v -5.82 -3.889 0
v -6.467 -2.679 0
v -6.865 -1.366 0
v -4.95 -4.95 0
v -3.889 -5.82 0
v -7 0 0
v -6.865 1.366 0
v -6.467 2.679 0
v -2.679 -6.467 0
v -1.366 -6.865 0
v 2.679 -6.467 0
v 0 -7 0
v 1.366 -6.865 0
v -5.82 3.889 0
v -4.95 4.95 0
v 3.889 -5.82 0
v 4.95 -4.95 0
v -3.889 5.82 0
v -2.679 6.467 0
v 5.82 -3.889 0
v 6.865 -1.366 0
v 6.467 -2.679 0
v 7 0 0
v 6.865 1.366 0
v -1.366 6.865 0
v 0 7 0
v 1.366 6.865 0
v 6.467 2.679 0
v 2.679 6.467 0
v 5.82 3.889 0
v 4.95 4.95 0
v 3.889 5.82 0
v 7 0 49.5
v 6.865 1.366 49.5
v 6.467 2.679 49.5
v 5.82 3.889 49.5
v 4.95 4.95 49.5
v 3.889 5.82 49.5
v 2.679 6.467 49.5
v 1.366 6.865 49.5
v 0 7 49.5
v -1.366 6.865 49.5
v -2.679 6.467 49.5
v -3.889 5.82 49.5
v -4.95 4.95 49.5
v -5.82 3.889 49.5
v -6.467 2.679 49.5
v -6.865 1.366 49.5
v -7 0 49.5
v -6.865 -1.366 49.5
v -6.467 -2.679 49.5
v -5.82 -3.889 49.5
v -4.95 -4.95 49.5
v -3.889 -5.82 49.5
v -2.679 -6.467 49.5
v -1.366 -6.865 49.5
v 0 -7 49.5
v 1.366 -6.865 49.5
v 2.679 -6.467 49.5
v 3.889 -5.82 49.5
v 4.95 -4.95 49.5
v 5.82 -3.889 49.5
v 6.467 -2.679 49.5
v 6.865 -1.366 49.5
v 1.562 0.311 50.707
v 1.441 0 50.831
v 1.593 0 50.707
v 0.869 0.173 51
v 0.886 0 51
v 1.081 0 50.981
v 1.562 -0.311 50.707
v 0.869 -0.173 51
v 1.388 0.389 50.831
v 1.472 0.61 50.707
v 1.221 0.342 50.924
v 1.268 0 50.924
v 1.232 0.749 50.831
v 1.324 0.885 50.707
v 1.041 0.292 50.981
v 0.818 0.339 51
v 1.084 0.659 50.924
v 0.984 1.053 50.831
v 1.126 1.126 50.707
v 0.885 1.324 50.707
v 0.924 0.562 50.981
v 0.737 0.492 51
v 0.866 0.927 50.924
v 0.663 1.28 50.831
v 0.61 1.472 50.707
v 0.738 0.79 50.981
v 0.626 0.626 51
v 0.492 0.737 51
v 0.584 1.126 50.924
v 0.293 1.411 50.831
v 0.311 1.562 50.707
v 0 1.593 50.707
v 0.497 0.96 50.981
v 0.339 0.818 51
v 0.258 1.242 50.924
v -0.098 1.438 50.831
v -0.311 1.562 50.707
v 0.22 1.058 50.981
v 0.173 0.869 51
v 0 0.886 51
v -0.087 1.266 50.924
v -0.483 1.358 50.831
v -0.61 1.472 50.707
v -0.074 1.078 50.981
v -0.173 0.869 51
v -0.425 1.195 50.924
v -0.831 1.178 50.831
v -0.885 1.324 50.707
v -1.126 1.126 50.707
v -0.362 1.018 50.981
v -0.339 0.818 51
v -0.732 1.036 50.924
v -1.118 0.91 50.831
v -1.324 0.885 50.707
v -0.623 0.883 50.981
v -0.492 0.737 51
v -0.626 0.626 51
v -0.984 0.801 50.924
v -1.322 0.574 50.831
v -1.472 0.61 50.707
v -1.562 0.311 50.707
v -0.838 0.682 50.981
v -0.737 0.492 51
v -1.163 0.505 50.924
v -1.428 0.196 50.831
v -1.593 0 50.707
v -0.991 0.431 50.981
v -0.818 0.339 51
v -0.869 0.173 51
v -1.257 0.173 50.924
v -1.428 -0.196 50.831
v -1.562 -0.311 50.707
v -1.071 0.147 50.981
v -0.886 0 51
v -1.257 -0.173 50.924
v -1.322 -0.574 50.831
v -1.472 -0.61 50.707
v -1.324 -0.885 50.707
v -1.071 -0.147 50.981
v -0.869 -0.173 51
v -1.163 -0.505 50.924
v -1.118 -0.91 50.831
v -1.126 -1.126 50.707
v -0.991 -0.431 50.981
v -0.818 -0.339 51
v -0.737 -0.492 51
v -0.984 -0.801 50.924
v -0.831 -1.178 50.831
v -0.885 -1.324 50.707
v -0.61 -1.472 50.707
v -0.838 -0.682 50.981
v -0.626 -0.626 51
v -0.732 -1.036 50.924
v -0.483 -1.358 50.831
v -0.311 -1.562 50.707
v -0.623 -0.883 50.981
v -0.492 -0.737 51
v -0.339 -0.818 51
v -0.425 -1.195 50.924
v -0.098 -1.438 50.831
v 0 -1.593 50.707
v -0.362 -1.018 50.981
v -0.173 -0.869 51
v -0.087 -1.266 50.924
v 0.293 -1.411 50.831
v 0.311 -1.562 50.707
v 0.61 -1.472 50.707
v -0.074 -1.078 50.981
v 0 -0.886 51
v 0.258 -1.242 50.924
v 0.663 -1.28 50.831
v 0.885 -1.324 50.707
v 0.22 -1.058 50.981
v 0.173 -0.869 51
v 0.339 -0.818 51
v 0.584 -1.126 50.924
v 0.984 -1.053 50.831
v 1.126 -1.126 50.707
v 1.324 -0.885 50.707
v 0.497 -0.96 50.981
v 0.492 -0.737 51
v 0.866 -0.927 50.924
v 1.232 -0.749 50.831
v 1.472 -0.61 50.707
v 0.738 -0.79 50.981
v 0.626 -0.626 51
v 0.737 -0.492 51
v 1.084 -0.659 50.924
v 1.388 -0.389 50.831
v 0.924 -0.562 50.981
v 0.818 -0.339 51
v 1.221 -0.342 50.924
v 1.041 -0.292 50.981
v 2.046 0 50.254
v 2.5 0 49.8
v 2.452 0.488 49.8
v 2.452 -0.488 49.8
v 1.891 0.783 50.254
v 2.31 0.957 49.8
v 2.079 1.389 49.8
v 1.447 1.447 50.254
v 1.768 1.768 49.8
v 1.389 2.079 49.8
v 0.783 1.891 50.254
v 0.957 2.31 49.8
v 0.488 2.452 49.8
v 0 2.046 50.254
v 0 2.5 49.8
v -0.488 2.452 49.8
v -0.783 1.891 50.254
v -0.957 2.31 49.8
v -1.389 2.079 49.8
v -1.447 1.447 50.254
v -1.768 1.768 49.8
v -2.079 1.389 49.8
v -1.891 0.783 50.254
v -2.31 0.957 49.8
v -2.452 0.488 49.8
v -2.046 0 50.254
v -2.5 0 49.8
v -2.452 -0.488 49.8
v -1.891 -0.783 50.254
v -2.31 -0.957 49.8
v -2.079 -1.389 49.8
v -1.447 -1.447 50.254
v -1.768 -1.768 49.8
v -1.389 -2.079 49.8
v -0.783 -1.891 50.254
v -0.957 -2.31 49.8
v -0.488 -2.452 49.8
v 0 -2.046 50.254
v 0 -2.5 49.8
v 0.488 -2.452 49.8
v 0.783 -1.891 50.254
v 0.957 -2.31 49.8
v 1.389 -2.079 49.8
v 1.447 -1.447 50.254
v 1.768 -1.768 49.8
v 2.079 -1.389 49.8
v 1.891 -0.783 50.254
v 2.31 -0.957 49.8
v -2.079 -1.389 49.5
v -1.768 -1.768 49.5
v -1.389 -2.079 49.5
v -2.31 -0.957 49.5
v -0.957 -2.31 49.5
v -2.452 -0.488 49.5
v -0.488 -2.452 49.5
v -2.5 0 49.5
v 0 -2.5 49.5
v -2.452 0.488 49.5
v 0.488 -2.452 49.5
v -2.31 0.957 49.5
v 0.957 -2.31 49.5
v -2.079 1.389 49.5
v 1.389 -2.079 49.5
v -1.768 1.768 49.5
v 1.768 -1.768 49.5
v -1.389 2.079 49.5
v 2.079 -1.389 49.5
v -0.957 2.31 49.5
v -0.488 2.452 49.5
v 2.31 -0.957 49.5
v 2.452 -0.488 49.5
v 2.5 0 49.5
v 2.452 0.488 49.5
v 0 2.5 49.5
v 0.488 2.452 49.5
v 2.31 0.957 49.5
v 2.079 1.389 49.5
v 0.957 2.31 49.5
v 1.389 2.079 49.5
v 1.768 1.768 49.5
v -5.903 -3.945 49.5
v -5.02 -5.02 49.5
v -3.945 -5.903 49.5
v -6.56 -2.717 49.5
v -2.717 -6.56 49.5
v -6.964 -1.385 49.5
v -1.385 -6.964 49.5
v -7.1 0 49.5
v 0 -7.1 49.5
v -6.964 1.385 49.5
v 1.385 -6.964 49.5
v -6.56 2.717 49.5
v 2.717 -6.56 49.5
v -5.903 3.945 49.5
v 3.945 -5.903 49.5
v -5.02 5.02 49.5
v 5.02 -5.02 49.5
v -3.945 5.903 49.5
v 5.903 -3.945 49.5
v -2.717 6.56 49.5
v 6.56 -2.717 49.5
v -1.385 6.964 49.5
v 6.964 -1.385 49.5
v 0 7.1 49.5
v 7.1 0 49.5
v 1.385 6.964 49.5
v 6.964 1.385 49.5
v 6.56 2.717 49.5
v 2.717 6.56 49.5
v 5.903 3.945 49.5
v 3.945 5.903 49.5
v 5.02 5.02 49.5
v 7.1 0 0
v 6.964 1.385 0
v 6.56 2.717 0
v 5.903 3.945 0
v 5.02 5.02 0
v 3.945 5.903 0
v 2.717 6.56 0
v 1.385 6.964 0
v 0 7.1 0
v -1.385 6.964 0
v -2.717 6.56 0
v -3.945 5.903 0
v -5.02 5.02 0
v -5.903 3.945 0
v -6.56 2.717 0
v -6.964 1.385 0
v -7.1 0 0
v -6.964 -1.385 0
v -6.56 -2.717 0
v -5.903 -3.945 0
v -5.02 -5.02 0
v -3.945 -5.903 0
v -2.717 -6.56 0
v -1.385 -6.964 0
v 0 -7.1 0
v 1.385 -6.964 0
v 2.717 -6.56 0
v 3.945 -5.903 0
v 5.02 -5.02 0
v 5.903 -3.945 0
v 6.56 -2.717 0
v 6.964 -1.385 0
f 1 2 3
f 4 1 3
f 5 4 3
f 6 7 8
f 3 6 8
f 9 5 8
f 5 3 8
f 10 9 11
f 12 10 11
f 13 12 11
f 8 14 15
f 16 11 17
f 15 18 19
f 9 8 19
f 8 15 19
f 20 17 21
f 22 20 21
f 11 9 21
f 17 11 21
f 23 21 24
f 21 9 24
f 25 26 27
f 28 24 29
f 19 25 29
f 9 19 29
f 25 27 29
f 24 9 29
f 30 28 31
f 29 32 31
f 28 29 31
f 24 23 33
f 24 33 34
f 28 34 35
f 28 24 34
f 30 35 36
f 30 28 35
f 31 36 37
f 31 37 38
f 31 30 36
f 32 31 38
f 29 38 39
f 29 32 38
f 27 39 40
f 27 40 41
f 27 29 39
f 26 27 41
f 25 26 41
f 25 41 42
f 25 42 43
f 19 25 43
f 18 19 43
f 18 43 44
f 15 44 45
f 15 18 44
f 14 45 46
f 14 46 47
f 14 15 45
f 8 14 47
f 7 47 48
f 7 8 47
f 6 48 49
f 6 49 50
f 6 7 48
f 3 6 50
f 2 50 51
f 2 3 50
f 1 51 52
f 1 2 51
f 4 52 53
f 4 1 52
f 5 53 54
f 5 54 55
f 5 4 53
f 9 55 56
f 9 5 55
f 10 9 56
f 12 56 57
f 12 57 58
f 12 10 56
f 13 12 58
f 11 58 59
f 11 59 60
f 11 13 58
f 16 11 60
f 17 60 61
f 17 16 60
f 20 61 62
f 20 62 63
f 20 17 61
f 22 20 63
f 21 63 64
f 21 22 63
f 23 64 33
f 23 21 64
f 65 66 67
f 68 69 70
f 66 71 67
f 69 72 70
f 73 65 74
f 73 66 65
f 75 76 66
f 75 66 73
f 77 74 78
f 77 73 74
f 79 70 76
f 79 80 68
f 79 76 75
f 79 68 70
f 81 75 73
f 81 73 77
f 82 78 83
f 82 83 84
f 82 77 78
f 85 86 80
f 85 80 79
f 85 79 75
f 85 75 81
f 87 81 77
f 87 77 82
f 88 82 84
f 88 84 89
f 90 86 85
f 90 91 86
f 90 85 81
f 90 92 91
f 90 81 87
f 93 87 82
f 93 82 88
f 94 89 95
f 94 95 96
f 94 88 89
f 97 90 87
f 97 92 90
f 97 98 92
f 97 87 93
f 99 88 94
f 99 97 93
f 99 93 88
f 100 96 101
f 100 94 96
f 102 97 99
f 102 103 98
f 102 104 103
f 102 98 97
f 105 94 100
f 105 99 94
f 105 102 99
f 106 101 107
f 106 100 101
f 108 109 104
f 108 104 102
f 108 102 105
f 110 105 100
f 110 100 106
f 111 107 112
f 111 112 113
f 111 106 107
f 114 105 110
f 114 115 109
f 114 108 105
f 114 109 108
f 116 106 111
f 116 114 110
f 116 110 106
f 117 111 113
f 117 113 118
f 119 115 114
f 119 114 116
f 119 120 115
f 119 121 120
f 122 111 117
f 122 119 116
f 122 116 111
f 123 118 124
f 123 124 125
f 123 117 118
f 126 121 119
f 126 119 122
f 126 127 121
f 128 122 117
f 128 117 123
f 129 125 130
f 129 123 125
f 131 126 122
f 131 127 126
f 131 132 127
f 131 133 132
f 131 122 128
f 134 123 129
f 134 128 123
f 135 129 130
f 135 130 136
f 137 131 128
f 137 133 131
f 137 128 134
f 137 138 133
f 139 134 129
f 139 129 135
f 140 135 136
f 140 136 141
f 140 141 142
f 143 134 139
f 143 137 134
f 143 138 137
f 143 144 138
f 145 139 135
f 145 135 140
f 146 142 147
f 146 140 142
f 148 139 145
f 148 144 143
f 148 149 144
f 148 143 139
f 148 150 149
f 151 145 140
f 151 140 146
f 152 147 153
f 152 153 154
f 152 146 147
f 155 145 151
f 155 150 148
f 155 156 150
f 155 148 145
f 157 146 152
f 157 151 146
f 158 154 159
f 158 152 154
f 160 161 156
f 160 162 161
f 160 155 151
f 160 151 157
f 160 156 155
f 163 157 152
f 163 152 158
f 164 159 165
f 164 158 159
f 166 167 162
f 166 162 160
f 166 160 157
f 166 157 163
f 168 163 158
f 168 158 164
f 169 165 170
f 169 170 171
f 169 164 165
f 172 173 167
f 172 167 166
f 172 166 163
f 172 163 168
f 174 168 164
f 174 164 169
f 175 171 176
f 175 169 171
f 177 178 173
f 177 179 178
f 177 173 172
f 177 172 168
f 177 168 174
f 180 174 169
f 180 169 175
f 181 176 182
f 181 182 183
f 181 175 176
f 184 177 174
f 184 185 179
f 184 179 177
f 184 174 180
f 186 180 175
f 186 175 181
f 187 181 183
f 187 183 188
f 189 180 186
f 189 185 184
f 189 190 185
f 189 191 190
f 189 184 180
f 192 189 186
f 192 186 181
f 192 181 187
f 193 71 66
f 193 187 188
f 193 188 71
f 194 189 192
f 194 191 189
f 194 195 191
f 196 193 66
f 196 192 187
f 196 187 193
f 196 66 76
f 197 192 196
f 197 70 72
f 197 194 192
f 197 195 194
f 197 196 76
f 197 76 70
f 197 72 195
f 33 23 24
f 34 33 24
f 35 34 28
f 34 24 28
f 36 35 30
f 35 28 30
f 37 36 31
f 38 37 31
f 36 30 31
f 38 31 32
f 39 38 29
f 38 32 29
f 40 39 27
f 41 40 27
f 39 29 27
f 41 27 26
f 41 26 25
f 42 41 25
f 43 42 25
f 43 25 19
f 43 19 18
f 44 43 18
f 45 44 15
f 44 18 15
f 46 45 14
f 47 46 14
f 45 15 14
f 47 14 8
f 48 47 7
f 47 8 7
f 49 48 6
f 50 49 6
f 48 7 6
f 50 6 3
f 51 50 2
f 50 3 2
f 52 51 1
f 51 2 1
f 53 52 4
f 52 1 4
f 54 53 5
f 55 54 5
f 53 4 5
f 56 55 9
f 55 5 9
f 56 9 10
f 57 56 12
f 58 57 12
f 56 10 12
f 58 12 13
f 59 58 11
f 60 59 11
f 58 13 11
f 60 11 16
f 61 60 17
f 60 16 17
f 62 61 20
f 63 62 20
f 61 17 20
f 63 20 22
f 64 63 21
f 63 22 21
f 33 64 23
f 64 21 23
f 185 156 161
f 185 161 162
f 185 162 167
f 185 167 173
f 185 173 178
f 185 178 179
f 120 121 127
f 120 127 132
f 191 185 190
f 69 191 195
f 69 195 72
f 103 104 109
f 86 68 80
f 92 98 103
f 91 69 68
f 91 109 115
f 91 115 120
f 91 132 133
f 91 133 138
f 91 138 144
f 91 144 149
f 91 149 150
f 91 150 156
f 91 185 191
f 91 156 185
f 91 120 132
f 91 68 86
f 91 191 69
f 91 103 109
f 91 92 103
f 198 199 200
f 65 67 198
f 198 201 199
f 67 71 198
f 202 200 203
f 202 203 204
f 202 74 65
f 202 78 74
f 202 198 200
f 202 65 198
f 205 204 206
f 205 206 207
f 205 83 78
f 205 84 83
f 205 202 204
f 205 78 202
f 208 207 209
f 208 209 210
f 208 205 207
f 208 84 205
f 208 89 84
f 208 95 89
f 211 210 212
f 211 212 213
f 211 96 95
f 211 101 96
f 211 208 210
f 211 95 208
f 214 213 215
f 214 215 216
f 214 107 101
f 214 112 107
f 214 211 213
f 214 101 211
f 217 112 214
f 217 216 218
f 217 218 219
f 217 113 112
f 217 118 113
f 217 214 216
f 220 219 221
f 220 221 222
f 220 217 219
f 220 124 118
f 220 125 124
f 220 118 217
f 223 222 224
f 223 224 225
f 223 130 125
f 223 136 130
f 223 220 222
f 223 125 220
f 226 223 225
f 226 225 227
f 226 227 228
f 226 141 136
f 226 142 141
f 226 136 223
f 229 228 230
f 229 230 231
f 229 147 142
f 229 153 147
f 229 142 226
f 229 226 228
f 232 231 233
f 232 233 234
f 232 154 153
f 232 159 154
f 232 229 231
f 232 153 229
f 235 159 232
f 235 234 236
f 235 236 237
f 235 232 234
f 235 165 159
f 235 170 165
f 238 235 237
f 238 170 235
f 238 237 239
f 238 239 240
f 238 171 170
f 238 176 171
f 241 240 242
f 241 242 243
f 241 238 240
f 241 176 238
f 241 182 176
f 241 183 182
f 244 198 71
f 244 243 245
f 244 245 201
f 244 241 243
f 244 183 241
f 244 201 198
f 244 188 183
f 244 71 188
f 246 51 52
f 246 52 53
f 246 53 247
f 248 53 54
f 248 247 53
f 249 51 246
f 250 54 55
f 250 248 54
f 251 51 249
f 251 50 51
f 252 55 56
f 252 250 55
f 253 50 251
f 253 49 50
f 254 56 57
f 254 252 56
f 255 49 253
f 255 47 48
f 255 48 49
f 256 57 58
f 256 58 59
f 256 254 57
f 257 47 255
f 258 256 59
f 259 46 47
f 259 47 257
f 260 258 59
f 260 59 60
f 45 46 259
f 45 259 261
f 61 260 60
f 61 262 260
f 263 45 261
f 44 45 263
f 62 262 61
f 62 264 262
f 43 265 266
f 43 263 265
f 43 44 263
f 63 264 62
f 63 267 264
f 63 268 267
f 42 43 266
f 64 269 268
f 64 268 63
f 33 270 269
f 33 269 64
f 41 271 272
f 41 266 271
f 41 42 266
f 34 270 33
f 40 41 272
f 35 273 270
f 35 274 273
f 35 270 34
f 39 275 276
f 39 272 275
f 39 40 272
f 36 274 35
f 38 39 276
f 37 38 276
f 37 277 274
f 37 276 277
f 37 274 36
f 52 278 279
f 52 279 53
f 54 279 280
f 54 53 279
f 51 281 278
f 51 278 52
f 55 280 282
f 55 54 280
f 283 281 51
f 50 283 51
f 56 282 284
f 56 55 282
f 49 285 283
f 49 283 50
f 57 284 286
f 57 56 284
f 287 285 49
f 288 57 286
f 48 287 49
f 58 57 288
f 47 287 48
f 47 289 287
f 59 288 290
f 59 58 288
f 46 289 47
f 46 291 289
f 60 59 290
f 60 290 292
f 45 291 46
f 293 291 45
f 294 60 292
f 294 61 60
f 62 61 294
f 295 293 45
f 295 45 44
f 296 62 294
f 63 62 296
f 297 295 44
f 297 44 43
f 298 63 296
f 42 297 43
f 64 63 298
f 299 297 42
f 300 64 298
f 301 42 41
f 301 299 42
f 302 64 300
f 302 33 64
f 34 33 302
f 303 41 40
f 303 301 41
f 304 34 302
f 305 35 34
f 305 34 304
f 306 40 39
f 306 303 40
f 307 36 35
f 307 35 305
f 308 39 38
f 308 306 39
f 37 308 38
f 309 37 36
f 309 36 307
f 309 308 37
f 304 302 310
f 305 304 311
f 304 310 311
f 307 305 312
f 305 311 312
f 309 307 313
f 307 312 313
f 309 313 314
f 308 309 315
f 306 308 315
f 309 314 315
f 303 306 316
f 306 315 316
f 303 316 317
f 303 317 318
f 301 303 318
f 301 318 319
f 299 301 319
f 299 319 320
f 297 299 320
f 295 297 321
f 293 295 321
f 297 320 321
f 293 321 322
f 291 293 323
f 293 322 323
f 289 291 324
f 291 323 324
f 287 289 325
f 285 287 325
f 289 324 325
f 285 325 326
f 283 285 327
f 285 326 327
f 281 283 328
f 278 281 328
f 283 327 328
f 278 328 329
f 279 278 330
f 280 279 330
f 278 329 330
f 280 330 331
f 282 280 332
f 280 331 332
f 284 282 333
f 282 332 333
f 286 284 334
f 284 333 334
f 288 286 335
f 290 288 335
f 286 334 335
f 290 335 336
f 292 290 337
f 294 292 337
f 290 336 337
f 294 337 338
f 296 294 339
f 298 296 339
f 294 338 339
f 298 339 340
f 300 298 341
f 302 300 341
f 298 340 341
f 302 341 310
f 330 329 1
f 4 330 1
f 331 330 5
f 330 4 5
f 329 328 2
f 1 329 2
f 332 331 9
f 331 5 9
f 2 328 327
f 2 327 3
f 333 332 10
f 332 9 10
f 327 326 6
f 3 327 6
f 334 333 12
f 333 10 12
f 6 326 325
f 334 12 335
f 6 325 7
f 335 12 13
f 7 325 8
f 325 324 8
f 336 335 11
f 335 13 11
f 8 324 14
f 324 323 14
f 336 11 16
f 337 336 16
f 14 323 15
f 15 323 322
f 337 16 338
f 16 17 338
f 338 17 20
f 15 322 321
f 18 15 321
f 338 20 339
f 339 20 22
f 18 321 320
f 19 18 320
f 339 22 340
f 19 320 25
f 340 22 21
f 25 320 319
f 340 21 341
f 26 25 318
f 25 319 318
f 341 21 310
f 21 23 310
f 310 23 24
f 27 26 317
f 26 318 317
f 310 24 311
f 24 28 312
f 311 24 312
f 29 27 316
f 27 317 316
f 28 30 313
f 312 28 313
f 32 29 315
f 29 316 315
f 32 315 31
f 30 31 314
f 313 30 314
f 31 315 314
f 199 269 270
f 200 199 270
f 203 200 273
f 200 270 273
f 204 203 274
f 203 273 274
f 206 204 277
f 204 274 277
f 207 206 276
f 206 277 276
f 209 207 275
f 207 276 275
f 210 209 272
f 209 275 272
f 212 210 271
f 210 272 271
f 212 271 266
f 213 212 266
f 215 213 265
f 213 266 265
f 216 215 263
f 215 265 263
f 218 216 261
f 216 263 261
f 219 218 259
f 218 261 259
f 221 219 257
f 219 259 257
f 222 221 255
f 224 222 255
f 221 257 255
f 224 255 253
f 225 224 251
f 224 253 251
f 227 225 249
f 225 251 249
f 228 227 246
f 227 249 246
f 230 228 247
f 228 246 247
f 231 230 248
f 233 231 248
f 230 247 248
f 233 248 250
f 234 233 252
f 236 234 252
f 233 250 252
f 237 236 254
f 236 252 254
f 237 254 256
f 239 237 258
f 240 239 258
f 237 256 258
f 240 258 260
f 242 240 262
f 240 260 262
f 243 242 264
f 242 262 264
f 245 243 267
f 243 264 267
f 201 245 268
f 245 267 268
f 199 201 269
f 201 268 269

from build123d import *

# Parameters (mm, degrees)
SKETCH_R      = 7
PAD_DEPTH     = 49.5
SKETCH001_R   = 2.5
PAD001_DEPTH  = 1.5
CHAMFER_SIZE  = 1.2
FILLET_R      = 1
SKETCH002_R   = 7.1
SKETCH002_R_2 = 7
PAD002_DEPTH  = 49.5


with BuildPart() as mainbody:
    # Sketch → Pad (new body)
    with BuildSketch(Plane.XY):
        Circle(SKETCH_R)
    extrude(amount=PAD_DEPTH)

    # Sketch001 (on Face3 of Pad) → Pad001 (join)
    with BuildSketch(Plane.XY.offset(49.5)):
        Circle(SKETCH001_R)
    extrude(amount=PAD001_DEPTH)

    # Chamfer
    chamfer_edges = [mainbody.edges().sort_by_distance(p)[0] for p in [
        (-2.5, 0, 51),
    ]]
    chamfer(chamfer_edges, length=CHAMFER_SIZE)

    # Fillet
    fillet_edges = [mainbody.edges().sort_by_distance(p)[0] for p in [
        (-1.3, 0, 51),
    ]]
    fillet(fillet_edges, radius=FILLET_R)


with BuildPart() as body001:
    # Sketch002 → Pad002 (new body)
    with BuildSketch(Plane.XY):
        Circle(SKETCH002_R)
        Circle(SKETCH002_R_2, mode=Mode.SUBTRACT)
    extrude(amount=PAD002_DEPTH)


solid = Compound([mainbody.part, body001.part])
